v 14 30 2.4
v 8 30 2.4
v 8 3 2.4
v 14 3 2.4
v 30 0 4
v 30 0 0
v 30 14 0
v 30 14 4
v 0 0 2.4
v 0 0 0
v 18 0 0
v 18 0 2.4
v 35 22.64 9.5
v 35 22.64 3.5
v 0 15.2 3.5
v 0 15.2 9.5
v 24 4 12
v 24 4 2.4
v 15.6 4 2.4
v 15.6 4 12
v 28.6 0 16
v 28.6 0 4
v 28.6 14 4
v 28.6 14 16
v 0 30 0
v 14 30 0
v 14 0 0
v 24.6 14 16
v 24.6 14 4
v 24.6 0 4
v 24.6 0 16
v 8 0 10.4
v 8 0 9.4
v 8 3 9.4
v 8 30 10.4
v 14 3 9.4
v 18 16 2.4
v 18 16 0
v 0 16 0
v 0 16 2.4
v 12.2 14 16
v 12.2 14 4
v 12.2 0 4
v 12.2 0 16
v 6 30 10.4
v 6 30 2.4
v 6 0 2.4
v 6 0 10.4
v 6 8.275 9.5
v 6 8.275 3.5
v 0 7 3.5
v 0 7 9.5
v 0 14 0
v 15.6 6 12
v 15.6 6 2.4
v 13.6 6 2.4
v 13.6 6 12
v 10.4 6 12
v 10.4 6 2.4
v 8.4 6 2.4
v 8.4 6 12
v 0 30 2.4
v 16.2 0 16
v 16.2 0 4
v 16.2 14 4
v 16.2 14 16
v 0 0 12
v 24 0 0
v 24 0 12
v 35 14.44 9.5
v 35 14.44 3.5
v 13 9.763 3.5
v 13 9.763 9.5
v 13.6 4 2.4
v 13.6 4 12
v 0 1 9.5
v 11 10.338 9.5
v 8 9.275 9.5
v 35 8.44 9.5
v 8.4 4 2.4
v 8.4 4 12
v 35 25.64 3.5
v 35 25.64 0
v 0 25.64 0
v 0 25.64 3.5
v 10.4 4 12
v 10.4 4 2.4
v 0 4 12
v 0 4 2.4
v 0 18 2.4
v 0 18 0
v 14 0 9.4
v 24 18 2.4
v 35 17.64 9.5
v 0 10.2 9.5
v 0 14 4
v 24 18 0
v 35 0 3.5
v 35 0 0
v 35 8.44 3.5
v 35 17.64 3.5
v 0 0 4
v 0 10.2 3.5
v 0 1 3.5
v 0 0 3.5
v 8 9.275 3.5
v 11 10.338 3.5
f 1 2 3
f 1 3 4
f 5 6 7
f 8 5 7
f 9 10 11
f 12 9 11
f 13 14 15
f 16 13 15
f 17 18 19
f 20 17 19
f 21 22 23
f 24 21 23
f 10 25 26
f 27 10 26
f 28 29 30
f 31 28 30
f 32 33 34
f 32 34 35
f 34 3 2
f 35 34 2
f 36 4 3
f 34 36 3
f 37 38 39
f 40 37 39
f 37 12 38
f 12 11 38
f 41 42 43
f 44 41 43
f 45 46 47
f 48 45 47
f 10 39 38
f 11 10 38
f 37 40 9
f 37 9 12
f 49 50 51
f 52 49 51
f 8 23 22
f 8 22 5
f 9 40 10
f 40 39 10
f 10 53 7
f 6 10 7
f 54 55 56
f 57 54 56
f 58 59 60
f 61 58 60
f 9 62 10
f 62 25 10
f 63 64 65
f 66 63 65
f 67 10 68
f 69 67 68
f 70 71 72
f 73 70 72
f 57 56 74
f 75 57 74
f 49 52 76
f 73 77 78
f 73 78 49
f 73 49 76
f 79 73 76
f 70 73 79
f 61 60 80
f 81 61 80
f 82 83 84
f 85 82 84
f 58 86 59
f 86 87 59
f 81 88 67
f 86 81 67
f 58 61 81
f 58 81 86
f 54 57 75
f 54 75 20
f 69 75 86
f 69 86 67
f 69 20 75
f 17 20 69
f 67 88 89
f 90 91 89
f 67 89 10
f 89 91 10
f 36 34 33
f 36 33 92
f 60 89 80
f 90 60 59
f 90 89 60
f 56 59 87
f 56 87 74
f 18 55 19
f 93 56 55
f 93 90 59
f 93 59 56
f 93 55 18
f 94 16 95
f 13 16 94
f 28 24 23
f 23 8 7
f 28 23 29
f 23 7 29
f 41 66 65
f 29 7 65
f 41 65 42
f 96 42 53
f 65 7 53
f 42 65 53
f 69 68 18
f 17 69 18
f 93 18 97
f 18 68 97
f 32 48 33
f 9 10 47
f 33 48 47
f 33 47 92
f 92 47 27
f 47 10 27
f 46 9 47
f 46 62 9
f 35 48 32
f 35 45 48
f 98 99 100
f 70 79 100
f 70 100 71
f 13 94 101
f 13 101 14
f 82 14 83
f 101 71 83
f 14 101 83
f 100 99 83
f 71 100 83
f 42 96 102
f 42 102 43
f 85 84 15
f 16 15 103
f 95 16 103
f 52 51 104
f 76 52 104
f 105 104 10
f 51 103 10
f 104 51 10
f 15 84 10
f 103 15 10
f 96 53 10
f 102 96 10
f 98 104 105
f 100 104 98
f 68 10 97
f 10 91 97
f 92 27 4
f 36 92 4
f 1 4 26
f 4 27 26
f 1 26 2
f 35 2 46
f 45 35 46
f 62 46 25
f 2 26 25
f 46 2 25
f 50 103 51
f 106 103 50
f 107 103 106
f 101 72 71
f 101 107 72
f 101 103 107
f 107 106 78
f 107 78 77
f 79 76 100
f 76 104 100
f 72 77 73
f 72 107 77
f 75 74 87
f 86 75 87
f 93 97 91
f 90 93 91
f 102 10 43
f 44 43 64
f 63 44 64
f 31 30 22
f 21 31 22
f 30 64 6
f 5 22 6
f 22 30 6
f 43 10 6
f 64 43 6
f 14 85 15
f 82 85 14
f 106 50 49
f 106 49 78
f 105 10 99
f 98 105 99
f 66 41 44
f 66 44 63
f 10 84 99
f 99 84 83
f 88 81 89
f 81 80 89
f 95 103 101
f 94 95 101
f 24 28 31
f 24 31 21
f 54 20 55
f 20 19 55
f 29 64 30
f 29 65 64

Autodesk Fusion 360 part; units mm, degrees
sketch "Sketch1" plane through (0, 0, 0) normal (0, 0, 1) x (1, 0, 0) in component "Component"
  line L0 (0, 0) -> (35, 0)
  line L1 (35, 0) -> (35, 25.6395)
  line L2 (35, 25.6395) -> (0, 25.6395)
  line L3 (0, 25.6395) -> (0, 0)
extrude "Extrude1" add sketch "Sketch1" along normal blind 3.5 makes body 1 in component "Component"
sketch "Sketch2" plane through (0, 0, 0) normal (0, 0, 1) x (1, 0, 0) in component "Component"
  line L0 (0, 1) -> (35, 8.4395)
  line L1 (35, 8.4395) -> (35, 14.4395)
  line L2 (35, 14.4395) -> (0, 7)
  line L3 (0, 7) -> (0, 1)
extrude "Extrude2" add sketch "Sketch2" along normal blind 6 from surface at 3.5 separate body makes body 2 in component "Component"
sketch "Sketch3" plane through (0, 0, 0) normal (0, 0, 1) x (1, 0, 0) in component "Component"
  line L0 (0, 10.2) -> (35, 17.6395)
  line L1 (35, 17.6395) -> (35, 22.6395)
  line L2 (35, 22.6395) -> (0, 15.2)
  line L3 (0, 15.2) -> (0, 10.2)
extrude "Extrude3" add sketch "Sketch3" along normal blind 6 from surface at 3.5 separate body makes body 3 in component "Component"
sketch "Sketch4" plane through (0, 0, 0) normal (0, 0, 1) x (1, 0, 0) in component "Component"
  line L0 (6, 8.2753) -> (8, 9.2753)
  line L1 (8, 9.2753) -> (11, 10.3381)
  line L2 (11, 10.3381) -> (13, 9.7632)
  line L3 (13, 9.7632) -> (6, 8.2753)
extrude "Extrude4" add sketch "Sketch4" along normal blind 6 from surface at 3.5 separate body makes body 4 in component "Component"
combine "Combine1" operation add target body 1 tool bodies 2 3 4 in component "Component"
sketch "Sketch1 (2)" plane through (0, 0, 0) normal (0, 0, 1) x (1, 0, 0) in component "Component'"
  line L0 (0, 0) -> (14, 0)
  line L1 (14, 0) -> (14, 30)
  line L2 (14, 30) -> (0, 30)
  line L3 (0, 30) -> (0, 0)
extrude "Extrude1'" add sketch "Sketch1 (2)" along normal blind 2.4 separate body makes body 5 in component "Component'"
sketch "Sketch2 (2)" plane through (0, 0, 0) normal (0, 0, 1) x (1, 0, 0) in component "Component'"
  line L0 (6, 0) -> (8, 0)
  line L1 (8, 0) -> (8, 30)
  line L2 (8, 30) -> (6, 30)
  line L3 (6, 30) -> (6, 0)
extrude "Extrude2'" add sketch "Sketch2 (2)" along normal blind 8 from surface at 2.4 separate body makes body 6 in component "Component'"
sketch "Sketch3 (2)" plane through (0, 0, 0) normal (0, 0, 1) x (1, 0, 0) in component "Component'"
  line L0 (6, 0) -> (14, 0)
  line L1 (14, 0) -> (14, 3)
  line L2 (14, 3) -> (6, 3)
  line L3 (6, 3) -> (6, 0)
extrude "Extrude3'" add sketch "Sketch3 (2)" along normal blind 7 from surface at 2.4 separate body makes body 7 in component "Component'"
combine "Combine1'" operation add target body 5 tool bodies 6 7 in component "Component'"
sketch "Sketch1 (3)" plane through (0, 0, 0) normal (0, 0, 1) x (1, 0, 0) in component "Component''"
  line L0 (0, 0) -> (24, 0)
  line L1 (24, 0) -> (24, 18)
  line L2 (24, 18) -> (0, 18)
  line L3 (0, 18) -> (0, 0)
extrude "Extrude1''" add sketch "Sketch1 (3)" along normal blind 2.4 separate body makes body 8 in component "Component''"
sketch "Sketch2 (3)" plane through (0, 0, 0) normal (0, 0, 1) x (1, 0, 0) in component "Component''"
  line L0 (0, 0) -> (24, 0)
  line L1 (24, 0) -> (24, 4)
  line L2 (24, 4) -> (0, 4)
  line L3 (0, 4) -> (0, 0)
extrude "Extrude2''" add sketch "Sketch2 (3)" along normal blind 12 separate body makes body 9 in component "Component''"
sketch "Sketch3 (3)" plane through (0, 0, 0) normal (0, 0, 1) x (1, 0, 0) in component "Component''"
  line L0 (8.4, 4) -> (10.4, 4)
  line L1 (10.4, 4) -> (10.4, 6)
  line L2 (10.4, 6) -> (8.4, 6)
  line L3 (8.4, 6) -> (8.4, 4)
extrude "Extrude3''" add sketch "Sketch3 (3)" along normal blind 9.6 from surface at 2.4 separate body makes body 10 in component "Component''"
sketch "Sketch4 (2)" plane through (0, 0, 0) normal (0, 0, 1) x (1, 0, 0) in component "Component''"
  line L0 (13.6, 4) -> (15.6, 4)
  line L1 (15.6, 4) -> (15.6, 6)
  line L2 (15.6, 6) -> (13.6, 6)
  line L3 (13.6, 6) -> (13.6, 4)
extrude "Extrude4'" add sketch "Sketch4 (2)" along normal blind 9.6 from surface at 2.4 separate body makes body 11 in component "Component''"
combine "Combine1''" operation add target body 8 tool bodies 9 10 11 in component "Component''"
sketch "Sketch1 (4)" plane through (0, 0, 0) normal (0, 0, 1) x (1, 0, 0) in component "Component'''"
  line L0 (0, 0) -> (18, 0)
  line L1 (18, 0) -> (18, 16)
  line L2 (18, 16) -> (0, 16)
  line L3 (0, 16) -> (0, 0)
extrude "Extrude1'''" add sketch "Sketch1 (4)" along normal blind 2.4 separate body makes body 12 in component "Component'''"
sketch "Sketch1 (5)" plane through (0, 0, 0) normal (0, 0, 1) x (1, 0, 0) in component "Component''''"
  line L0 (0, 0) -> (30, 0)
  line L1 (30, 0) -> (30, 14)
  line L2 (30, 14) -> (0, 14)
  line L3 (0, 14) -> (0, 0)
extrude "Extrude1''''" add sketch "Sketch1 (5)" along normal blind 4 separate body makes body 13 in component "Component''''"
sketch "Sketch2 (4)" plane through (0, 0, 0) normal (0, 0, 1) x (1, 0, 0) in component "Component''''"
  line L0 (12.2, 0) -> (16.2, 0)
  line L1 (16.2, 0) -> (16.2, 14)
  line L2 (16.2, 14) -> (12.2, 14)
  line L3 (12.2, 14) -> (12.2, 0)
extrude "Extrude2'''" add sketch "Sketch2 (4)" along normal blind 12 from surface at 4 separate body makes body 14 in component "Component''''"
sketch "Sketch3 (4)" plane through (0, 0, 0) normal (0, 0, 1) x (1, 0, 0) in component "Component''''"
  line L0 (24.6, 0) -> (28.6, 0)
  line L1 (28.6, 0) -> (28.6, 14)
  line L2 (28.6, 14) -> (24.6, 14)
  line L3 (24.6, 14) -> (24.6, 0)
extrude "Extrude3'''" add sketch "Sketch3 (4)" along normal blind 12 from surface at 4 separate body makes body 15 in component "Component''''"
combine "Combine1'''" operation add target body 13 tool bodies 14 15 in component "Component''''"
component "Component" placed x (1, 0, 0) y (0, 1, 0) z (0, 0, 1) at (0, 0, 0)
component "Component'" placed x (1, 0, 0) y (0, 1, 0) z (0, 0, 1) at (0, 0, 0)
component "Component''" placed x (1, 0, 0) y (0, 1, 0) z (0, 0, 1) at (0, 0, 0)
component "Component'''" placed x (1, 0, 0) y (0, 1, 0) z (0, 0, 1) at (0, 0, 0)
component "Component''''" placed x (1, 0, 0) y (0, 1, 0) z (0, 0, 1) at (0, 0, 0)
